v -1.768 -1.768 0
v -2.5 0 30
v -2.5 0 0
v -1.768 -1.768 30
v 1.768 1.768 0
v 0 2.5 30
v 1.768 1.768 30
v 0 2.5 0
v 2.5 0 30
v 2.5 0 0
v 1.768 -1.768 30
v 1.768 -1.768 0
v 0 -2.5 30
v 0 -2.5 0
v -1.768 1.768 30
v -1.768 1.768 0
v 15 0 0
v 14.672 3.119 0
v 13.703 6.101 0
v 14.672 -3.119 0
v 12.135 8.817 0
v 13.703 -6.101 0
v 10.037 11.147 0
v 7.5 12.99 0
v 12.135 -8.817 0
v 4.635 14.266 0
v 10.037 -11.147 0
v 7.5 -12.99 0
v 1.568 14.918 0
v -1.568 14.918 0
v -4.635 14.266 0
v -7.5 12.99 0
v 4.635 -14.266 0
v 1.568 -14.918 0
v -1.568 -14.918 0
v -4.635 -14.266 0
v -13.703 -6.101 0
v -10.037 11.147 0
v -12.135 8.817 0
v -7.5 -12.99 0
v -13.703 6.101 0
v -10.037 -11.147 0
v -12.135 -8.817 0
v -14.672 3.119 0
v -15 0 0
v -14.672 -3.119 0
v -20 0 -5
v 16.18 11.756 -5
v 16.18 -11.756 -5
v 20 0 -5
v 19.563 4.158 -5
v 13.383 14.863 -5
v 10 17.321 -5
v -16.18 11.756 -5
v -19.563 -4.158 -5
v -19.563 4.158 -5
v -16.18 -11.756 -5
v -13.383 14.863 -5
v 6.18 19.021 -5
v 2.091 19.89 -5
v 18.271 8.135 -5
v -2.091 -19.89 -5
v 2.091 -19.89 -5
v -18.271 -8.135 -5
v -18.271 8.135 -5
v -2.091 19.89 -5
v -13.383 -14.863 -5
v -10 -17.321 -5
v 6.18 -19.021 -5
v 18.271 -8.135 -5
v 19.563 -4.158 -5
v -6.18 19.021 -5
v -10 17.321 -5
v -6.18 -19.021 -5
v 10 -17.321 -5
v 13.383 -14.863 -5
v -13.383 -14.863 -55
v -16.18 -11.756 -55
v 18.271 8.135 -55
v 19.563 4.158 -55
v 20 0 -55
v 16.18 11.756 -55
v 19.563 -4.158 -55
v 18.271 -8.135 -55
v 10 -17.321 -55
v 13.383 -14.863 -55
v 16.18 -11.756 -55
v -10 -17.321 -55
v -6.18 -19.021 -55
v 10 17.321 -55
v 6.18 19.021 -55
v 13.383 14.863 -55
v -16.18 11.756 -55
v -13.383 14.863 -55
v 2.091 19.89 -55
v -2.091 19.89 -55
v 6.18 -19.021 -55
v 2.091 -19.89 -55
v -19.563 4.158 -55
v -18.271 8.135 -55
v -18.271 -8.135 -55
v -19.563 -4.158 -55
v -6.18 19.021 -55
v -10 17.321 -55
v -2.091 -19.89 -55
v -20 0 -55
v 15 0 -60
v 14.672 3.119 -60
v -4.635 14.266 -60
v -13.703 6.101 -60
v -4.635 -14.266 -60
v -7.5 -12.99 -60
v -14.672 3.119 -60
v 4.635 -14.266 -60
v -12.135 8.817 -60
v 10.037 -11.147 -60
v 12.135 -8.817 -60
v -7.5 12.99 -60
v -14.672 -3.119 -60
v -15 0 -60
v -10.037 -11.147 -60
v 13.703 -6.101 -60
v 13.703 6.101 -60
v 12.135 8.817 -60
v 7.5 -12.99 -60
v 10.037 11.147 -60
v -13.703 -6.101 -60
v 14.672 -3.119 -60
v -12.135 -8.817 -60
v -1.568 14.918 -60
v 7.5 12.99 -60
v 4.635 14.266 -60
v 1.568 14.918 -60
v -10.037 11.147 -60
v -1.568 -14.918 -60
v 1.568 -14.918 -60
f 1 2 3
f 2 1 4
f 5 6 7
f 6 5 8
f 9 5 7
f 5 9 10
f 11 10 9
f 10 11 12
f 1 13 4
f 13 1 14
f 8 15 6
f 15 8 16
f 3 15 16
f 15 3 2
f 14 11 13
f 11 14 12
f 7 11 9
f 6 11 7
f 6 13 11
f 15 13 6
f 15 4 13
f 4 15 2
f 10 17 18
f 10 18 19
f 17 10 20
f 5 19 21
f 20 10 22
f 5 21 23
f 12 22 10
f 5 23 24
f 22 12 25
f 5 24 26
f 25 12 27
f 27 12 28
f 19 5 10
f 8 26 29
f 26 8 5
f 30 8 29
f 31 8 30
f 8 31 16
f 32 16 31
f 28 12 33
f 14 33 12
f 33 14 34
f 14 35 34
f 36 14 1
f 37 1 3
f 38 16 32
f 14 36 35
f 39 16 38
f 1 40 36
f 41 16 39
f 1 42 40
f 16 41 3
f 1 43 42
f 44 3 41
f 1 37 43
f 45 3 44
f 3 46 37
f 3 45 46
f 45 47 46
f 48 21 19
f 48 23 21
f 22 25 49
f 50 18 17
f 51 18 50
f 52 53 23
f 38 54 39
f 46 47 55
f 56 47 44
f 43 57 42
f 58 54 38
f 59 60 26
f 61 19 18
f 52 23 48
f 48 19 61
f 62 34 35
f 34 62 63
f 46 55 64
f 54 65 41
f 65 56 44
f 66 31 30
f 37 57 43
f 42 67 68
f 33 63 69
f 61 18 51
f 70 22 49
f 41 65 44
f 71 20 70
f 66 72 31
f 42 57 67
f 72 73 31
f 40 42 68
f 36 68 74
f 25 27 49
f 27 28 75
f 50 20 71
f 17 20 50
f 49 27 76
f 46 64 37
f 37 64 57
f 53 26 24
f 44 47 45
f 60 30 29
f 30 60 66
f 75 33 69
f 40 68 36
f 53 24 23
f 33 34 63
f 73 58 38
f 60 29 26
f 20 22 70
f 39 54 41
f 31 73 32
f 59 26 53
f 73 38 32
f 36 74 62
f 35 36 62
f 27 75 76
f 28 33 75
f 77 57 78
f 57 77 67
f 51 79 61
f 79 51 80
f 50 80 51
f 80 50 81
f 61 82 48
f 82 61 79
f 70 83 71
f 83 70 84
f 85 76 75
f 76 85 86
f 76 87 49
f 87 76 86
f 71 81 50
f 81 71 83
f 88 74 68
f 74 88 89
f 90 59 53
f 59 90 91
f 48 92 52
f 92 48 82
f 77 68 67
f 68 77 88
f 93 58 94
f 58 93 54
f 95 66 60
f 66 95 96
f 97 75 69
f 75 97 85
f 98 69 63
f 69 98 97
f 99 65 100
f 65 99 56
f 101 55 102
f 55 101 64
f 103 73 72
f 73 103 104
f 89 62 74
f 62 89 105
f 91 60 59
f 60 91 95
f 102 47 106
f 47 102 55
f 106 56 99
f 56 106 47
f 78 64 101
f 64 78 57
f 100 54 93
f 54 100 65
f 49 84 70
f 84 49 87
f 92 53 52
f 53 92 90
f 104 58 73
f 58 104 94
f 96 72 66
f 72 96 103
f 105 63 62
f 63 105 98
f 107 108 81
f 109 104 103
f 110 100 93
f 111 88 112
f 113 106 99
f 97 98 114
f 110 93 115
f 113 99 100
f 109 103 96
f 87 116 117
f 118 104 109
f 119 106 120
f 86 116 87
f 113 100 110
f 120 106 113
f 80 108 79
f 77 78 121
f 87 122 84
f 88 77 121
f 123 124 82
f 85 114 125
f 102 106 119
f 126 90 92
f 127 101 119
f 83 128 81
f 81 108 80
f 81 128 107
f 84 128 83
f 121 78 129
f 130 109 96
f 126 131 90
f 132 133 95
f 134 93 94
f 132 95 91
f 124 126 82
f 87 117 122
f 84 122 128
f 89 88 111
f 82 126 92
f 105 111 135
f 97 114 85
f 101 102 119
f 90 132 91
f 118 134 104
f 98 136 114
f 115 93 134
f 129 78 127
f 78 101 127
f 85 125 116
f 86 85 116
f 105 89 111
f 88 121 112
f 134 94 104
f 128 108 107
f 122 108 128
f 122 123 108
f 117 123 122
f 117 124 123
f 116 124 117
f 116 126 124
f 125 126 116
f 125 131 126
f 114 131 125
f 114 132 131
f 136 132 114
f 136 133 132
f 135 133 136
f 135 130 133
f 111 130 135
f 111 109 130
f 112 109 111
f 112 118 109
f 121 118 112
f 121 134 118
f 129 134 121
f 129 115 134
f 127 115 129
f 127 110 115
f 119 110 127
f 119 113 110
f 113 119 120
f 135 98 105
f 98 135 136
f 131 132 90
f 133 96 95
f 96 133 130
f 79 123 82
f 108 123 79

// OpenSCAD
module motor_prerotator(){
    body_height = 60;
    body_diameter = 40;
    body_bevel = 10;
    axis_diameter = 5;
    axis_length = 30;

    cylinder(d = axis_diameter, h = axis_length);

        translate([0, 0, -body_bevel/2])
            cylinder(h = body_bevel/2, d1 = body_diameter, d2 = body_diameter-body_bevel);

        translate([0, 0, -body_height + body_bevel/2])
            cylinder(h = body_height - body_bevel, d = body_diameter);

        translate([0, 0, -body_height])
            cylinder(h = body_bevel/2, d2 = body_diameter, d1 = body_diameter-body_bevel);
}


motor_prerotator();
